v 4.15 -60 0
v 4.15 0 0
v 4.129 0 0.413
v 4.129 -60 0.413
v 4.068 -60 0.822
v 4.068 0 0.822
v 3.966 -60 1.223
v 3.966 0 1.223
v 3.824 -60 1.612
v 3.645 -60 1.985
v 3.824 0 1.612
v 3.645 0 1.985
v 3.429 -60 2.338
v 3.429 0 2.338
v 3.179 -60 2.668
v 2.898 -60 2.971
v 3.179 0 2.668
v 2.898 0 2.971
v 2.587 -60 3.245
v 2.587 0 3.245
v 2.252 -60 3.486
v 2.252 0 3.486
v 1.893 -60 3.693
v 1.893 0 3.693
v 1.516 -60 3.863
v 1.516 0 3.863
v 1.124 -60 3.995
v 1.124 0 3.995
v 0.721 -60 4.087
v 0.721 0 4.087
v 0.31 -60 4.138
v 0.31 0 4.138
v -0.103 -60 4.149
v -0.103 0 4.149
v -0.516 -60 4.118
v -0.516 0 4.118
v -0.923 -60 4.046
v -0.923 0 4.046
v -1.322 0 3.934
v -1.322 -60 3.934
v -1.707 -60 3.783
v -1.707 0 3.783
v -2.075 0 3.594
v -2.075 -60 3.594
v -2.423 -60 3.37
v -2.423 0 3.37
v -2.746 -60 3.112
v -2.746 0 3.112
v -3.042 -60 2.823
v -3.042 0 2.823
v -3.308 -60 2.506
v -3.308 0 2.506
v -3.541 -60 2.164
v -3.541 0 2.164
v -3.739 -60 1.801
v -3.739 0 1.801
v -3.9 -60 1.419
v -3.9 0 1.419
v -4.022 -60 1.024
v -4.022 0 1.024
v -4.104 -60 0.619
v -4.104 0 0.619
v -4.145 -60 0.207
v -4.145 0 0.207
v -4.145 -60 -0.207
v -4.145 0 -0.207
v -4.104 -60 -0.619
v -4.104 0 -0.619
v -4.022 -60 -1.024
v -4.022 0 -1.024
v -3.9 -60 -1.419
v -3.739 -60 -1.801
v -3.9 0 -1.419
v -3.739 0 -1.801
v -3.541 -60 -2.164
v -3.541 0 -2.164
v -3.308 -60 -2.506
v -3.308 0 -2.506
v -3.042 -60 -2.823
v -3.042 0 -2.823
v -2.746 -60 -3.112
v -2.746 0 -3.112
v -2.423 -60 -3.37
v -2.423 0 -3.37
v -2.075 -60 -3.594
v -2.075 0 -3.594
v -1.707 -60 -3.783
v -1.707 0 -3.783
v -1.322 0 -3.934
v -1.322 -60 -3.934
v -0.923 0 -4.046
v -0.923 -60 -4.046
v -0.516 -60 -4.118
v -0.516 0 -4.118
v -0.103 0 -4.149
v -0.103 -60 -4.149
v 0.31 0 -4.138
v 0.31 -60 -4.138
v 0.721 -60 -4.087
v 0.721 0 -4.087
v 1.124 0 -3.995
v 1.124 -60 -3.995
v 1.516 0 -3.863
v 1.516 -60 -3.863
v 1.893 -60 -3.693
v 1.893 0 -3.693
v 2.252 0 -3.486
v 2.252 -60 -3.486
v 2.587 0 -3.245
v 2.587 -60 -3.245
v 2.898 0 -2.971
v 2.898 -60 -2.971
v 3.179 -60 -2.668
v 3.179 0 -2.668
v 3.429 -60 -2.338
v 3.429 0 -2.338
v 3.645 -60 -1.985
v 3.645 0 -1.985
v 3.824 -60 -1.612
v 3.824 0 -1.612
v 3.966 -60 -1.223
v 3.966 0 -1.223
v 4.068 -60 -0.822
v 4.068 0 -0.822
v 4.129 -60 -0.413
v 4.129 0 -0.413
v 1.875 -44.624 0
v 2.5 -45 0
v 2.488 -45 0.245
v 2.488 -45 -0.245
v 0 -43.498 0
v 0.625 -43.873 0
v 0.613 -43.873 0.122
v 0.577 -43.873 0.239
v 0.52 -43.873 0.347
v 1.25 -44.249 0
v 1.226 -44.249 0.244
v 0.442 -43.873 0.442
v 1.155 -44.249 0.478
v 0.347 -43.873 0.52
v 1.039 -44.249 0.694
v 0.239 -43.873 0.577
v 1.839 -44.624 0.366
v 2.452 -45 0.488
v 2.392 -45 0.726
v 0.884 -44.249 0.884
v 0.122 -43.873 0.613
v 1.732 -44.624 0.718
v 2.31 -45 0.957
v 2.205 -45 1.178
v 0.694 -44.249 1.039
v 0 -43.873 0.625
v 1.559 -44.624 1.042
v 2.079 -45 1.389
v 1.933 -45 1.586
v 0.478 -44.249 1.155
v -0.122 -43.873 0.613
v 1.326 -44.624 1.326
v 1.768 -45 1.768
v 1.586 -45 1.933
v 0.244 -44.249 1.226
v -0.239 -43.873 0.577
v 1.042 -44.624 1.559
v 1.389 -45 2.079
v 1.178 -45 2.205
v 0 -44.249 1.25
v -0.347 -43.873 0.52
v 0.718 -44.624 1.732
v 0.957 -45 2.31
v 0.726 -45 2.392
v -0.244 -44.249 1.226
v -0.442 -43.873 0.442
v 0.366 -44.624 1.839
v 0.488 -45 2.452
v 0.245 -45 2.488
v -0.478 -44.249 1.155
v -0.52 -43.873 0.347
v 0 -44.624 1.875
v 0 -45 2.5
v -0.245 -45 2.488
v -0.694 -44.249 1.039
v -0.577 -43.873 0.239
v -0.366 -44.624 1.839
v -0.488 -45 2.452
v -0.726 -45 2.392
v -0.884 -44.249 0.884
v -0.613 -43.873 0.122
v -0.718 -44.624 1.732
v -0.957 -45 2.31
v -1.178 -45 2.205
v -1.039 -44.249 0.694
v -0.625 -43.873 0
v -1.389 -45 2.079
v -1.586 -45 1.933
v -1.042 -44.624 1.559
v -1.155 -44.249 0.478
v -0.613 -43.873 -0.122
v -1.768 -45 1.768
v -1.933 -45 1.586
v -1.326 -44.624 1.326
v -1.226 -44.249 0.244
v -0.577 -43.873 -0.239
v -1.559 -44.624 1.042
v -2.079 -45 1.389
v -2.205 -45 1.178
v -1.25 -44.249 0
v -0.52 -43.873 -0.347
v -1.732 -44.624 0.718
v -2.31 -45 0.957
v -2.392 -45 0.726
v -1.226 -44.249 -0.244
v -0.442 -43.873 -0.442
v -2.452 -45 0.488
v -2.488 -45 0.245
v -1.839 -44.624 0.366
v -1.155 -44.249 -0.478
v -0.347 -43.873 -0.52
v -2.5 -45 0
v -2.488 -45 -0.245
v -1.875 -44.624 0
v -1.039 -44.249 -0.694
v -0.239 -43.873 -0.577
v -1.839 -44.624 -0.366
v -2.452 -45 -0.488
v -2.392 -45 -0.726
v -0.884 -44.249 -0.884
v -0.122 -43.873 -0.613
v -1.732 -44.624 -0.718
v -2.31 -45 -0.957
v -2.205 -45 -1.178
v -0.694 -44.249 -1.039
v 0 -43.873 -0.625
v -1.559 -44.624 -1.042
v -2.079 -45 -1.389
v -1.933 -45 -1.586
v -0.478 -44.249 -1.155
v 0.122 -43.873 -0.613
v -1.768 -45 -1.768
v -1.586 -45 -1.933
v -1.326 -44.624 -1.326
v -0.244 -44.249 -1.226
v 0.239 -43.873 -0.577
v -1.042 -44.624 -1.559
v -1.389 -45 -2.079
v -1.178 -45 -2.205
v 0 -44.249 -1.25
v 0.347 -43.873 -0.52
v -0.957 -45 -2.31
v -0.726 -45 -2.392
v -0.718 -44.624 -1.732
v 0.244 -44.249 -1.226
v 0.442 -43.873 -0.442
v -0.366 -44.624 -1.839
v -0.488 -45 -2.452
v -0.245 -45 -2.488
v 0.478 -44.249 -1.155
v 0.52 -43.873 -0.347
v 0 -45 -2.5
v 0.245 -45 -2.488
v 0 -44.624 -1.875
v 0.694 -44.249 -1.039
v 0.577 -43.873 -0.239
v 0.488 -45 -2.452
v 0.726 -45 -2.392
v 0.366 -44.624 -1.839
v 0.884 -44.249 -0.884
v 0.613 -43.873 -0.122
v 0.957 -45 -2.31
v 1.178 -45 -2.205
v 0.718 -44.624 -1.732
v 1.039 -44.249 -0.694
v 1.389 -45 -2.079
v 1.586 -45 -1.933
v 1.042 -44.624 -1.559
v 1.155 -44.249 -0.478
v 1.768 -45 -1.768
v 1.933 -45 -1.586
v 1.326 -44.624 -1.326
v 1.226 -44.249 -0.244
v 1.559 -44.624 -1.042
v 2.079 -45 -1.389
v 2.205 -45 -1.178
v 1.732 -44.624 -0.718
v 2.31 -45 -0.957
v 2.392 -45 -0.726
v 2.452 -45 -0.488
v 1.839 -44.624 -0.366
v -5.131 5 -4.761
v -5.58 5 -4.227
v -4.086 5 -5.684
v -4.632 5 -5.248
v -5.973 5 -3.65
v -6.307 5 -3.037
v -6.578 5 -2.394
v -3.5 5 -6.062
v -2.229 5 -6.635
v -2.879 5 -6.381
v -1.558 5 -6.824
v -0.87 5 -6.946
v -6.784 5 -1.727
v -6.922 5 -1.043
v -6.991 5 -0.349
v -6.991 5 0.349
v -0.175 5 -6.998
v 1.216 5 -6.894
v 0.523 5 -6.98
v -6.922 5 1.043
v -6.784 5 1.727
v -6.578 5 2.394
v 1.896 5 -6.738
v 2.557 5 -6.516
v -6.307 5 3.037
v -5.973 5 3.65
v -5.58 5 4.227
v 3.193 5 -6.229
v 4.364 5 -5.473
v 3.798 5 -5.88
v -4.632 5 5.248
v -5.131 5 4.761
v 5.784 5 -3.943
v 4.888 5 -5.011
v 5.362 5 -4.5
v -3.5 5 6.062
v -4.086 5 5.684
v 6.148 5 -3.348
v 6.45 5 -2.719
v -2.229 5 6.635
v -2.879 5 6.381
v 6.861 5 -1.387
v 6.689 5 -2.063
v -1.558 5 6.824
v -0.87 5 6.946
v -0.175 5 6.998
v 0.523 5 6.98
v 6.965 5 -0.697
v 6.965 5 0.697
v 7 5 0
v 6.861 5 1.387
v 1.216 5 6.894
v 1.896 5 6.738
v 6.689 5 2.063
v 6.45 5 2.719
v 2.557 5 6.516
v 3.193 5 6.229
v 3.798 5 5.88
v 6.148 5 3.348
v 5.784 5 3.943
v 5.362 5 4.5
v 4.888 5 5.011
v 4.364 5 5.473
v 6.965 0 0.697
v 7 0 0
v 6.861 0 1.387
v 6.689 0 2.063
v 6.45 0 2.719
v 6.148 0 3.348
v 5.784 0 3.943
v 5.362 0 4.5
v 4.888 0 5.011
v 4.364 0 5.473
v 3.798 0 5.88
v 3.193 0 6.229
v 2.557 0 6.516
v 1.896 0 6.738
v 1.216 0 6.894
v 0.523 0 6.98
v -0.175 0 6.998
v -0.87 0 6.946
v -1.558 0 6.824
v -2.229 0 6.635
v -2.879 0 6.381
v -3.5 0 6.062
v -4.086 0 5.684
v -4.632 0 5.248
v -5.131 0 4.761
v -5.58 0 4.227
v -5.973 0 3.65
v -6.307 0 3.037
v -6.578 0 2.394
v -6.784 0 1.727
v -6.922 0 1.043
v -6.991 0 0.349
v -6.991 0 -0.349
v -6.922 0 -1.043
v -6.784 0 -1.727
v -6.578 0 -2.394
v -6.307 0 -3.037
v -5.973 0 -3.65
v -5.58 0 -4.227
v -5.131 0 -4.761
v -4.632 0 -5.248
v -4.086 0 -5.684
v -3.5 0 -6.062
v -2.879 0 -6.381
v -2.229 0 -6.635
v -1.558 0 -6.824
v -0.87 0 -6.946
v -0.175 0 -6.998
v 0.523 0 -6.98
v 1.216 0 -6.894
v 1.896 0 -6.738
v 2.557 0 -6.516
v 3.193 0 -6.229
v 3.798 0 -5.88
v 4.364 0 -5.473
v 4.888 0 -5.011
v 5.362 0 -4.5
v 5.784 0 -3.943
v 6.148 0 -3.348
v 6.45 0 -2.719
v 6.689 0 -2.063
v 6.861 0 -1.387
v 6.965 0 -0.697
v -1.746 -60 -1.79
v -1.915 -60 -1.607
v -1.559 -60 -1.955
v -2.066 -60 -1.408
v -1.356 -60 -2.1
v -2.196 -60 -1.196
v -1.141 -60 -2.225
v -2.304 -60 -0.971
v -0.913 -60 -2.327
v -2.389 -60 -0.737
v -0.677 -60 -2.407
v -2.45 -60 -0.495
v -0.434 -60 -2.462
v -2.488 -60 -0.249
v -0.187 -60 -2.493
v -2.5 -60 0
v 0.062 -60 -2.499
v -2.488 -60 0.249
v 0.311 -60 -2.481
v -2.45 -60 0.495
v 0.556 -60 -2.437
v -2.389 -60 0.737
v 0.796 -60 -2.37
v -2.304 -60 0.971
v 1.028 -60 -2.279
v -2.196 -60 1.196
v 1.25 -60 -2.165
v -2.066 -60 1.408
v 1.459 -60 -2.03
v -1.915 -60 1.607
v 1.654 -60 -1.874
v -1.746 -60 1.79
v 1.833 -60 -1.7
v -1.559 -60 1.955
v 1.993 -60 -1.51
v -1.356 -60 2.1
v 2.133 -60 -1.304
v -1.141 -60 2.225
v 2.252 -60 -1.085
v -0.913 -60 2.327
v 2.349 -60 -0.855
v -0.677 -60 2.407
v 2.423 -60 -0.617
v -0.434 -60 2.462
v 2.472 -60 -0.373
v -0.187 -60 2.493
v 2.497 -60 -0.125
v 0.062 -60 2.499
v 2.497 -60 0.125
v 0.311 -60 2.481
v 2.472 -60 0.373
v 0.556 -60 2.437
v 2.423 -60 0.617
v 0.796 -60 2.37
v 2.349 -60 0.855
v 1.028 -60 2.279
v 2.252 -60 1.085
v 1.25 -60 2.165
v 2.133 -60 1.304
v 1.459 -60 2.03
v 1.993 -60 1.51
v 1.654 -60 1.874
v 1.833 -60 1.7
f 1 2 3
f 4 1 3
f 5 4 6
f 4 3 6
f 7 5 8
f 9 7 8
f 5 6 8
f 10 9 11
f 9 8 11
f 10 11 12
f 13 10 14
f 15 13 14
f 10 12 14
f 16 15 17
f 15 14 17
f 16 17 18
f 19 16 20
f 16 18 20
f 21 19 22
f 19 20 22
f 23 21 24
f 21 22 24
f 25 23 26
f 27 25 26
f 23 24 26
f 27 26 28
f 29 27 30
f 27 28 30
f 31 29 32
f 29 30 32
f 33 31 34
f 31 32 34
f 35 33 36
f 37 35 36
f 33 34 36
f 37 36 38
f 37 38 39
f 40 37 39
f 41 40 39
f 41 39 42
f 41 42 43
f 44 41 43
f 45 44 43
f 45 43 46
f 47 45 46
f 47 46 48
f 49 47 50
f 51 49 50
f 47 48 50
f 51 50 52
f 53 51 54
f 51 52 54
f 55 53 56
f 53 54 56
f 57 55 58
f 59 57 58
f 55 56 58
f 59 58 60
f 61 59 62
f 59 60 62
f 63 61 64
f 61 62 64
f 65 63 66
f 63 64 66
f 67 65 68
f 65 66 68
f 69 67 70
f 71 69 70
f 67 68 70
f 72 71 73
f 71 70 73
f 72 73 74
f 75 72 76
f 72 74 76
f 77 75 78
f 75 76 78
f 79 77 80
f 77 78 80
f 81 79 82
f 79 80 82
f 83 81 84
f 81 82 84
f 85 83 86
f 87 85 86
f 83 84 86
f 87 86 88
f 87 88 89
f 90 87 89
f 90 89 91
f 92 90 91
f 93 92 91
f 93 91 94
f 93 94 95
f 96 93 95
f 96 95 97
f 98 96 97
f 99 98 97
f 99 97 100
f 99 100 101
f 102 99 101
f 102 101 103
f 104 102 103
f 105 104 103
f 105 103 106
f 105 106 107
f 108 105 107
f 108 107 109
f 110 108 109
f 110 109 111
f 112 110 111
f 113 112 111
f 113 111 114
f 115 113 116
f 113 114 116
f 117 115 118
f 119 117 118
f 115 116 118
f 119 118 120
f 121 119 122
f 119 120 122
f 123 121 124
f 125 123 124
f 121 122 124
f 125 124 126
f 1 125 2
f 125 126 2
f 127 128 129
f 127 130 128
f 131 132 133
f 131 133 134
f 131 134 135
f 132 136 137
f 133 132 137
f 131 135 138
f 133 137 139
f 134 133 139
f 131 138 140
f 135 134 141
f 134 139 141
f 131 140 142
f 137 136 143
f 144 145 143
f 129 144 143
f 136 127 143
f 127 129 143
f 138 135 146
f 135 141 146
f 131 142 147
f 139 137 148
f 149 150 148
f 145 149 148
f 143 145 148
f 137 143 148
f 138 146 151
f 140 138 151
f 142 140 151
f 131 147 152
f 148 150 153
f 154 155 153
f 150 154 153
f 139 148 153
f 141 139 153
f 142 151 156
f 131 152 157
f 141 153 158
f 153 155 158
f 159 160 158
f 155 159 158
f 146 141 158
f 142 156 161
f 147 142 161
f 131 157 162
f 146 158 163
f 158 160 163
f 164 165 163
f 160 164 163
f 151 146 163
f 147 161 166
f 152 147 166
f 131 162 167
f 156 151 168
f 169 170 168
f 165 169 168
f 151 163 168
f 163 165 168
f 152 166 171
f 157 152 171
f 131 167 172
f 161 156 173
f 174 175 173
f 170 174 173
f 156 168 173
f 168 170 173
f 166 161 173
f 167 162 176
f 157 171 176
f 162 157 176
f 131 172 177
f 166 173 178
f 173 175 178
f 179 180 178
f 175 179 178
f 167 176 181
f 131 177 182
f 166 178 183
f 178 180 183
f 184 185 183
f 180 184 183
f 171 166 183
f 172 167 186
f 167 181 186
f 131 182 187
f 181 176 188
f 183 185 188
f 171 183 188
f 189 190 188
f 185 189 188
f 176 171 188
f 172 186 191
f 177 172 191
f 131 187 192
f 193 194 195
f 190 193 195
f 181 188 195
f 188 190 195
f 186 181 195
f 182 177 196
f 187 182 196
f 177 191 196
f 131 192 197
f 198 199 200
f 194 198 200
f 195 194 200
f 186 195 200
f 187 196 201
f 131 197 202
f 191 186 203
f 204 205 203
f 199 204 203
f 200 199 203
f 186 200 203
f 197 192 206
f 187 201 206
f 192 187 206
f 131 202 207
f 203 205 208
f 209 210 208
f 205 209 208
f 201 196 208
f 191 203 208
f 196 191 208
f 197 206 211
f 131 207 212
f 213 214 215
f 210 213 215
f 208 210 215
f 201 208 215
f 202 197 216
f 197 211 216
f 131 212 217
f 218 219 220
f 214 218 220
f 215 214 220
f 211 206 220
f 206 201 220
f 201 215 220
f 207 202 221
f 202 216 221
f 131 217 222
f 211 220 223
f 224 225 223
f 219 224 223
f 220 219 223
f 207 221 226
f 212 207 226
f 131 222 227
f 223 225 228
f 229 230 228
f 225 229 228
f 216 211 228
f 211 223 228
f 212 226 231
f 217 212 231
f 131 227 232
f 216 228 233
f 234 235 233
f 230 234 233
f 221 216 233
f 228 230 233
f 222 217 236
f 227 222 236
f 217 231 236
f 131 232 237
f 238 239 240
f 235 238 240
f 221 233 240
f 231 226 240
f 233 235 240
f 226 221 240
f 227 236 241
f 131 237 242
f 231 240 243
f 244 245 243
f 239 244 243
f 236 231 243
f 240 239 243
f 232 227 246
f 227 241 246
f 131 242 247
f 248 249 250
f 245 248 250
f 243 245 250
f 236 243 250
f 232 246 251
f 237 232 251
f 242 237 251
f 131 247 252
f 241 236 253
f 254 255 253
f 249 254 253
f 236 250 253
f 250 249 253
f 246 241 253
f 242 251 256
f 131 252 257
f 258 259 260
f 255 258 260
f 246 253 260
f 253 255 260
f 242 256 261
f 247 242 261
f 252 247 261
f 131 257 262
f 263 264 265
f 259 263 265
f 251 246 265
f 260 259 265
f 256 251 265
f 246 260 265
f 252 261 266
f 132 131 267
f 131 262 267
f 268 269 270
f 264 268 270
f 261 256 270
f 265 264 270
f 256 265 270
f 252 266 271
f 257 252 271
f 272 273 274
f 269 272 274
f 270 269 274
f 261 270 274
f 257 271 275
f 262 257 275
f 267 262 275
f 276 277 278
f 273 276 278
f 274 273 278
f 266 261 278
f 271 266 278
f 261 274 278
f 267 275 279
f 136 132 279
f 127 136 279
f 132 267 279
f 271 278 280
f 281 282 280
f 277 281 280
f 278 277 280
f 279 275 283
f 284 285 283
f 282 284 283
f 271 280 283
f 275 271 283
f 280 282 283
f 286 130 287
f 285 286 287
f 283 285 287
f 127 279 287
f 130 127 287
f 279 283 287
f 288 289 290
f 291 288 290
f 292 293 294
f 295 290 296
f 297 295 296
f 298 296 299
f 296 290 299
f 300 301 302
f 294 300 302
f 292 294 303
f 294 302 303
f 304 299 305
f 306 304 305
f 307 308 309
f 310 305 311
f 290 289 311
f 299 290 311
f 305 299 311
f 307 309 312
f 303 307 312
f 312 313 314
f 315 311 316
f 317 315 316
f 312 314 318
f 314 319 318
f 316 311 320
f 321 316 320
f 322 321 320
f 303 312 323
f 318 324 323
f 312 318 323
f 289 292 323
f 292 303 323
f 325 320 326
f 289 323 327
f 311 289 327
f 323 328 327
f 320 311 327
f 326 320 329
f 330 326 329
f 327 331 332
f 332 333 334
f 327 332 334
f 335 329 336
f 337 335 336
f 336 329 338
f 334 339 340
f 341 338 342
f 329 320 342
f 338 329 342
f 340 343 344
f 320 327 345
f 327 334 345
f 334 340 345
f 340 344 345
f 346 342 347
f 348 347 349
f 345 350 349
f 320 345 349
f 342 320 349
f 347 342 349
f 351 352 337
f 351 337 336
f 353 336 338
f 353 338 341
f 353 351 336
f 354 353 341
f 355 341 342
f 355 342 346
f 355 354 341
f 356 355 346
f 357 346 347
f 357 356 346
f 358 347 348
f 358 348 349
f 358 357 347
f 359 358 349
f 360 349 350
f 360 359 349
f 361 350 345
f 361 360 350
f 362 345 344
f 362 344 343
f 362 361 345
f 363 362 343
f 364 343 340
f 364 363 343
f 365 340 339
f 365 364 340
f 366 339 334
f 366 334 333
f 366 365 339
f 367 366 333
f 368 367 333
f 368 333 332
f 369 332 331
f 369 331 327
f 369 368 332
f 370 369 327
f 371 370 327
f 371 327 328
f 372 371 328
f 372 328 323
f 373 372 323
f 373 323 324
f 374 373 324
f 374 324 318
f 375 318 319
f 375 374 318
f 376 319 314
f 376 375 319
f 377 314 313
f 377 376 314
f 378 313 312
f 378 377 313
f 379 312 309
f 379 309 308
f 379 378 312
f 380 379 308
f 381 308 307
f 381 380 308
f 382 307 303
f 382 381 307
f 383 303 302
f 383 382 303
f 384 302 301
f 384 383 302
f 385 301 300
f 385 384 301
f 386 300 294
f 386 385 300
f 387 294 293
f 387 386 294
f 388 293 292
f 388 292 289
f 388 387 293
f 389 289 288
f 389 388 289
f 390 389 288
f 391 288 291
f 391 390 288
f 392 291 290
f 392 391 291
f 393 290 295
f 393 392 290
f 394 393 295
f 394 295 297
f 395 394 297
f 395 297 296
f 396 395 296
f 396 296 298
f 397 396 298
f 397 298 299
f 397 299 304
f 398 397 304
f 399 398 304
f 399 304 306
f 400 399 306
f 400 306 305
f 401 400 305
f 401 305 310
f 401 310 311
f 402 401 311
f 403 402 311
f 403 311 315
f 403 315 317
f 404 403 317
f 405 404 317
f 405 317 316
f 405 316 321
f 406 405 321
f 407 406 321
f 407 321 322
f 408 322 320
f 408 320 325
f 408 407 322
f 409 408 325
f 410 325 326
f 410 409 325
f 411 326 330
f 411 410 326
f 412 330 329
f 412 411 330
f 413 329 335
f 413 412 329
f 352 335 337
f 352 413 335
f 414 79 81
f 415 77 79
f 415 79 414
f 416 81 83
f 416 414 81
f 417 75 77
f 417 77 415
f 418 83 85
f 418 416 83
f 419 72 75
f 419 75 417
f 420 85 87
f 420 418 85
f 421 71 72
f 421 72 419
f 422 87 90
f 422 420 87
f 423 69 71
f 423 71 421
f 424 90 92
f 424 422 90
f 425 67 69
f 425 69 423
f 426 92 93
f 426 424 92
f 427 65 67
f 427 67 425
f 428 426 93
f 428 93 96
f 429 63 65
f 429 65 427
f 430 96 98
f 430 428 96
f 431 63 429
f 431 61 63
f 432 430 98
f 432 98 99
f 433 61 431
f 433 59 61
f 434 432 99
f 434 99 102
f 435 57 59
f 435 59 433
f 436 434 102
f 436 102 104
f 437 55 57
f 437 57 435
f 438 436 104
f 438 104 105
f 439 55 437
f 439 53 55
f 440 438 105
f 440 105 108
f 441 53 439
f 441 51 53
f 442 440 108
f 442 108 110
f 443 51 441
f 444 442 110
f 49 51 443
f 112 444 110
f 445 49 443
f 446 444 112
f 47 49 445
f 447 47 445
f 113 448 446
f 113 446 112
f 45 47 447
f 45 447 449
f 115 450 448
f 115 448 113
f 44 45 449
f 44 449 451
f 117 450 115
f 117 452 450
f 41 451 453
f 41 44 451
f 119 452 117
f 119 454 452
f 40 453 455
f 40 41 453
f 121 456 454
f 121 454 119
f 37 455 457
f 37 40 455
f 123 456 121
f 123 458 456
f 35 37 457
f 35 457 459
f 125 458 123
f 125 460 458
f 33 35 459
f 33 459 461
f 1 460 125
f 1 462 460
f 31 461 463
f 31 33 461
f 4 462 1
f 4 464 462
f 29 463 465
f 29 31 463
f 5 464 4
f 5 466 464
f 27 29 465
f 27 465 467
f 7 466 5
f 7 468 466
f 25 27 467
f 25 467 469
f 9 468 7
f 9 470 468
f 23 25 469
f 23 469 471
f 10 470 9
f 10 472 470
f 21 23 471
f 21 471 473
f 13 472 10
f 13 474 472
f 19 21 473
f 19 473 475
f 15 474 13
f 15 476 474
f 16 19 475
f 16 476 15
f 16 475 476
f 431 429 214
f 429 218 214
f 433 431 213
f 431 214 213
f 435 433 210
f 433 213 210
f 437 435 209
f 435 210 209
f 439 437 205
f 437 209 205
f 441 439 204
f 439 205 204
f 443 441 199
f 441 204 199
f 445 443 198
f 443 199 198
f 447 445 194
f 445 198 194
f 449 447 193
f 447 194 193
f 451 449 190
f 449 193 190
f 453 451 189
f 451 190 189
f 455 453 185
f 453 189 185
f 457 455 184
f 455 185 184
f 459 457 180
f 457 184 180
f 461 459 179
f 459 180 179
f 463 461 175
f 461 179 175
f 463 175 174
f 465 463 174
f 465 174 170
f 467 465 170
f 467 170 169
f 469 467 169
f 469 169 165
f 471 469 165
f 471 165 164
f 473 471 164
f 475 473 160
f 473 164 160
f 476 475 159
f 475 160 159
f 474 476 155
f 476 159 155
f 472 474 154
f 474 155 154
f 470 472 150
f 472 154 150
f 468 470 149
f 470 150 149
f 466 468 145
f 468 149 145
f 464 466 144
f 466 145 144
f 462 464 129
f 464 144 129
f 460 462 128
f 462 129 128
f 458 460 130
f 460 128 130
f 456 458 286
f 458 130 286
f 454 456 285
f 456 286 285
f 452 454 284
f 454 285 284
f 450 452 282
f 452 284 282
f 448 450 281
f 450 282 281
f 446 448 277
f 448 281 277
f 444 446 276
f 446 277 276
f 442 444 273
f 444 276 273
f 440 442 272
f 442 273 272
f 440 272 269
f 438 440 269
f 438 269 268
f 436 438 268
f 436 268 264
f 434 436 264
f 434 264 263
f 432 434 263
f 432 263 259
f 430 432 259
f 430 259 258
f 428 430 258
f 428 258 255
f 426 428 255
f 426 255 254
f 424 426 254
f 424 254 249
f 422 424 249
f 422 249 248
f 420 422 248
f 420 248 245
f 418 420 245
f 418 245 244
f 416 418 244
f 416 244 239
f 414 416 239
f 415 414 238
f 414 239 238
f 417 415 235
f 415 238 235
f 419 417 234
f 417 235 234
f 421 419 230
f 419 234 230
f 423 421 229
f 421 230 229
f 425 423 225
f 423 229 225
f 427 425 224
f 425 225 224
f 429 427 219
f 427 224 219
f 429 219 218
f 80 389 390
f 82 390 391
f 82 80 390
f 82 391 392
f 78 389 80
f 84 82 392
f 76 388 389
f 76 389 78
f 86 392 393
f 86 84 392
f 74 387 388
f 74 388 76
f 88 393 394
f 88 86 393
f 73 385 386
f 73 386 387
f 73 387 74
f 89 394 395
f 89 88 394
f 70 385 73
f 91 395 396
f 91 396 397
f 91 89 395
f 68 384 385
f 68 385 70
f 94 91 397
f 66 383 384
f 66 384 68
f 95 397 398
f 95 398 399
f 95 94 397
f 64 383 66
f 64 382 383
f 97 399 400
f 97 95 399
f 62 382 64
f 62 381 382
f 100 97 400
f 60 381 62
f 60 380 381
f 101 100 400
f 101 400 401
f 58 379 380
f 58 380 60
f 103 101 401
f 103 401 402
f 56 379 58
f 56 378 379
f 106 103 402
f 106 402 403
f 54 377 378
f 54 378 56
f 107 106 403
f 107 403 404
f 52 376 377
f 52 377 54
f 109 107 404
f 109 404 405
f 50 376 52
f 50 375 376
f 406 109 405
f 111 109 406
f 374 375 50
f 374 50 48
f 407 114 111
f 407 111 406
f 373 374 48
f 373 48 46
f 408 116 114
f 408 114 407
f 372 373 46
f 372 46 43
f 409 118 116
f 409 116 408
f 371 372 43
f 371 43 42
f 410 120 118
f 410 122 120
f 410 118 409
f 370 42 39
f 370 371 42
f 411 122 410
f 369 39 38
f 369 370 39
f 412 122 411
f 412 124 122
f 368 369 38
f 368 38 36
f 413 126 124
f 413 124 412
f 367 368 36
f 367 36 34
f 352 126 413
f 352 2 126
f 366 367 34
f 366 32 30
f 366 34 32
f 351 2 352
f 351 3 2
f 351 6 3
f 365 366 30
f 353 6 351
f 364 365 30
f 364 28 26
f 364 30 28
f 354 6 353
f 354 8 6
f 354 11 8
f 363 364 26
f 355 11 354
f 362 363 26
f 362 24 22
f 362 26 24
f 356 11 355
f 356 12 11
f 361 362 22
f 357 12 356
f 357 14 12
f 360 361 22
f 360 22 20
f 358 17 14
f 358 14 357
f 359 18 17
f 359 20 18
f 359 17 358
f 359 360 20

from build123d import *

# Parameters (mm, degrees)
F0_R      = 4.15
F1_DEPTH  = 60
F0_R_2    = 7
F1_FACE_R = 4.15
F2_DEPTH  = 5
F4_D      = 5
F4_DEPTH  = 15
F4_TIP    = 1.5021515476


with BuildPart() as f1:
    # F0 (on Front) → F1 (new body)
    with BuildSketch(Plane.XZ):
        Circle(F0_R)
    extrude(amount=F1_DEPTH)

    # F0 (on Front) + F1_face (on face) → F2 (join)
    with BuildSketch(Plane.XZ):
        Circle(F0_R_2)
        Circle(F0_R, mode=Mode.SUBTRACT)
    with BuildSketch(Plane(origin=(0, 0, 0), x_dir=(1, 0, 0), z_dir=(0, 1, 0))):
        Circle(F1_FACE_R)
    extrude(amount=-F2_DEPTH, dir=(0, -1, 0))

    # F4
    with Locations(Plane.XZ.offset(60)):
        with Locations((0, 0)):
            Hole(F4_D / 2, depth=F4_DEPTH)
            with Locations((0, 0, -(F4_DEPTH + F4_TIP / 2))):  # 118° drill point
                Cone(0, F4_D / 2, F4_TIP, mode=Mode.SUBTRACT)


solid = f1.part
